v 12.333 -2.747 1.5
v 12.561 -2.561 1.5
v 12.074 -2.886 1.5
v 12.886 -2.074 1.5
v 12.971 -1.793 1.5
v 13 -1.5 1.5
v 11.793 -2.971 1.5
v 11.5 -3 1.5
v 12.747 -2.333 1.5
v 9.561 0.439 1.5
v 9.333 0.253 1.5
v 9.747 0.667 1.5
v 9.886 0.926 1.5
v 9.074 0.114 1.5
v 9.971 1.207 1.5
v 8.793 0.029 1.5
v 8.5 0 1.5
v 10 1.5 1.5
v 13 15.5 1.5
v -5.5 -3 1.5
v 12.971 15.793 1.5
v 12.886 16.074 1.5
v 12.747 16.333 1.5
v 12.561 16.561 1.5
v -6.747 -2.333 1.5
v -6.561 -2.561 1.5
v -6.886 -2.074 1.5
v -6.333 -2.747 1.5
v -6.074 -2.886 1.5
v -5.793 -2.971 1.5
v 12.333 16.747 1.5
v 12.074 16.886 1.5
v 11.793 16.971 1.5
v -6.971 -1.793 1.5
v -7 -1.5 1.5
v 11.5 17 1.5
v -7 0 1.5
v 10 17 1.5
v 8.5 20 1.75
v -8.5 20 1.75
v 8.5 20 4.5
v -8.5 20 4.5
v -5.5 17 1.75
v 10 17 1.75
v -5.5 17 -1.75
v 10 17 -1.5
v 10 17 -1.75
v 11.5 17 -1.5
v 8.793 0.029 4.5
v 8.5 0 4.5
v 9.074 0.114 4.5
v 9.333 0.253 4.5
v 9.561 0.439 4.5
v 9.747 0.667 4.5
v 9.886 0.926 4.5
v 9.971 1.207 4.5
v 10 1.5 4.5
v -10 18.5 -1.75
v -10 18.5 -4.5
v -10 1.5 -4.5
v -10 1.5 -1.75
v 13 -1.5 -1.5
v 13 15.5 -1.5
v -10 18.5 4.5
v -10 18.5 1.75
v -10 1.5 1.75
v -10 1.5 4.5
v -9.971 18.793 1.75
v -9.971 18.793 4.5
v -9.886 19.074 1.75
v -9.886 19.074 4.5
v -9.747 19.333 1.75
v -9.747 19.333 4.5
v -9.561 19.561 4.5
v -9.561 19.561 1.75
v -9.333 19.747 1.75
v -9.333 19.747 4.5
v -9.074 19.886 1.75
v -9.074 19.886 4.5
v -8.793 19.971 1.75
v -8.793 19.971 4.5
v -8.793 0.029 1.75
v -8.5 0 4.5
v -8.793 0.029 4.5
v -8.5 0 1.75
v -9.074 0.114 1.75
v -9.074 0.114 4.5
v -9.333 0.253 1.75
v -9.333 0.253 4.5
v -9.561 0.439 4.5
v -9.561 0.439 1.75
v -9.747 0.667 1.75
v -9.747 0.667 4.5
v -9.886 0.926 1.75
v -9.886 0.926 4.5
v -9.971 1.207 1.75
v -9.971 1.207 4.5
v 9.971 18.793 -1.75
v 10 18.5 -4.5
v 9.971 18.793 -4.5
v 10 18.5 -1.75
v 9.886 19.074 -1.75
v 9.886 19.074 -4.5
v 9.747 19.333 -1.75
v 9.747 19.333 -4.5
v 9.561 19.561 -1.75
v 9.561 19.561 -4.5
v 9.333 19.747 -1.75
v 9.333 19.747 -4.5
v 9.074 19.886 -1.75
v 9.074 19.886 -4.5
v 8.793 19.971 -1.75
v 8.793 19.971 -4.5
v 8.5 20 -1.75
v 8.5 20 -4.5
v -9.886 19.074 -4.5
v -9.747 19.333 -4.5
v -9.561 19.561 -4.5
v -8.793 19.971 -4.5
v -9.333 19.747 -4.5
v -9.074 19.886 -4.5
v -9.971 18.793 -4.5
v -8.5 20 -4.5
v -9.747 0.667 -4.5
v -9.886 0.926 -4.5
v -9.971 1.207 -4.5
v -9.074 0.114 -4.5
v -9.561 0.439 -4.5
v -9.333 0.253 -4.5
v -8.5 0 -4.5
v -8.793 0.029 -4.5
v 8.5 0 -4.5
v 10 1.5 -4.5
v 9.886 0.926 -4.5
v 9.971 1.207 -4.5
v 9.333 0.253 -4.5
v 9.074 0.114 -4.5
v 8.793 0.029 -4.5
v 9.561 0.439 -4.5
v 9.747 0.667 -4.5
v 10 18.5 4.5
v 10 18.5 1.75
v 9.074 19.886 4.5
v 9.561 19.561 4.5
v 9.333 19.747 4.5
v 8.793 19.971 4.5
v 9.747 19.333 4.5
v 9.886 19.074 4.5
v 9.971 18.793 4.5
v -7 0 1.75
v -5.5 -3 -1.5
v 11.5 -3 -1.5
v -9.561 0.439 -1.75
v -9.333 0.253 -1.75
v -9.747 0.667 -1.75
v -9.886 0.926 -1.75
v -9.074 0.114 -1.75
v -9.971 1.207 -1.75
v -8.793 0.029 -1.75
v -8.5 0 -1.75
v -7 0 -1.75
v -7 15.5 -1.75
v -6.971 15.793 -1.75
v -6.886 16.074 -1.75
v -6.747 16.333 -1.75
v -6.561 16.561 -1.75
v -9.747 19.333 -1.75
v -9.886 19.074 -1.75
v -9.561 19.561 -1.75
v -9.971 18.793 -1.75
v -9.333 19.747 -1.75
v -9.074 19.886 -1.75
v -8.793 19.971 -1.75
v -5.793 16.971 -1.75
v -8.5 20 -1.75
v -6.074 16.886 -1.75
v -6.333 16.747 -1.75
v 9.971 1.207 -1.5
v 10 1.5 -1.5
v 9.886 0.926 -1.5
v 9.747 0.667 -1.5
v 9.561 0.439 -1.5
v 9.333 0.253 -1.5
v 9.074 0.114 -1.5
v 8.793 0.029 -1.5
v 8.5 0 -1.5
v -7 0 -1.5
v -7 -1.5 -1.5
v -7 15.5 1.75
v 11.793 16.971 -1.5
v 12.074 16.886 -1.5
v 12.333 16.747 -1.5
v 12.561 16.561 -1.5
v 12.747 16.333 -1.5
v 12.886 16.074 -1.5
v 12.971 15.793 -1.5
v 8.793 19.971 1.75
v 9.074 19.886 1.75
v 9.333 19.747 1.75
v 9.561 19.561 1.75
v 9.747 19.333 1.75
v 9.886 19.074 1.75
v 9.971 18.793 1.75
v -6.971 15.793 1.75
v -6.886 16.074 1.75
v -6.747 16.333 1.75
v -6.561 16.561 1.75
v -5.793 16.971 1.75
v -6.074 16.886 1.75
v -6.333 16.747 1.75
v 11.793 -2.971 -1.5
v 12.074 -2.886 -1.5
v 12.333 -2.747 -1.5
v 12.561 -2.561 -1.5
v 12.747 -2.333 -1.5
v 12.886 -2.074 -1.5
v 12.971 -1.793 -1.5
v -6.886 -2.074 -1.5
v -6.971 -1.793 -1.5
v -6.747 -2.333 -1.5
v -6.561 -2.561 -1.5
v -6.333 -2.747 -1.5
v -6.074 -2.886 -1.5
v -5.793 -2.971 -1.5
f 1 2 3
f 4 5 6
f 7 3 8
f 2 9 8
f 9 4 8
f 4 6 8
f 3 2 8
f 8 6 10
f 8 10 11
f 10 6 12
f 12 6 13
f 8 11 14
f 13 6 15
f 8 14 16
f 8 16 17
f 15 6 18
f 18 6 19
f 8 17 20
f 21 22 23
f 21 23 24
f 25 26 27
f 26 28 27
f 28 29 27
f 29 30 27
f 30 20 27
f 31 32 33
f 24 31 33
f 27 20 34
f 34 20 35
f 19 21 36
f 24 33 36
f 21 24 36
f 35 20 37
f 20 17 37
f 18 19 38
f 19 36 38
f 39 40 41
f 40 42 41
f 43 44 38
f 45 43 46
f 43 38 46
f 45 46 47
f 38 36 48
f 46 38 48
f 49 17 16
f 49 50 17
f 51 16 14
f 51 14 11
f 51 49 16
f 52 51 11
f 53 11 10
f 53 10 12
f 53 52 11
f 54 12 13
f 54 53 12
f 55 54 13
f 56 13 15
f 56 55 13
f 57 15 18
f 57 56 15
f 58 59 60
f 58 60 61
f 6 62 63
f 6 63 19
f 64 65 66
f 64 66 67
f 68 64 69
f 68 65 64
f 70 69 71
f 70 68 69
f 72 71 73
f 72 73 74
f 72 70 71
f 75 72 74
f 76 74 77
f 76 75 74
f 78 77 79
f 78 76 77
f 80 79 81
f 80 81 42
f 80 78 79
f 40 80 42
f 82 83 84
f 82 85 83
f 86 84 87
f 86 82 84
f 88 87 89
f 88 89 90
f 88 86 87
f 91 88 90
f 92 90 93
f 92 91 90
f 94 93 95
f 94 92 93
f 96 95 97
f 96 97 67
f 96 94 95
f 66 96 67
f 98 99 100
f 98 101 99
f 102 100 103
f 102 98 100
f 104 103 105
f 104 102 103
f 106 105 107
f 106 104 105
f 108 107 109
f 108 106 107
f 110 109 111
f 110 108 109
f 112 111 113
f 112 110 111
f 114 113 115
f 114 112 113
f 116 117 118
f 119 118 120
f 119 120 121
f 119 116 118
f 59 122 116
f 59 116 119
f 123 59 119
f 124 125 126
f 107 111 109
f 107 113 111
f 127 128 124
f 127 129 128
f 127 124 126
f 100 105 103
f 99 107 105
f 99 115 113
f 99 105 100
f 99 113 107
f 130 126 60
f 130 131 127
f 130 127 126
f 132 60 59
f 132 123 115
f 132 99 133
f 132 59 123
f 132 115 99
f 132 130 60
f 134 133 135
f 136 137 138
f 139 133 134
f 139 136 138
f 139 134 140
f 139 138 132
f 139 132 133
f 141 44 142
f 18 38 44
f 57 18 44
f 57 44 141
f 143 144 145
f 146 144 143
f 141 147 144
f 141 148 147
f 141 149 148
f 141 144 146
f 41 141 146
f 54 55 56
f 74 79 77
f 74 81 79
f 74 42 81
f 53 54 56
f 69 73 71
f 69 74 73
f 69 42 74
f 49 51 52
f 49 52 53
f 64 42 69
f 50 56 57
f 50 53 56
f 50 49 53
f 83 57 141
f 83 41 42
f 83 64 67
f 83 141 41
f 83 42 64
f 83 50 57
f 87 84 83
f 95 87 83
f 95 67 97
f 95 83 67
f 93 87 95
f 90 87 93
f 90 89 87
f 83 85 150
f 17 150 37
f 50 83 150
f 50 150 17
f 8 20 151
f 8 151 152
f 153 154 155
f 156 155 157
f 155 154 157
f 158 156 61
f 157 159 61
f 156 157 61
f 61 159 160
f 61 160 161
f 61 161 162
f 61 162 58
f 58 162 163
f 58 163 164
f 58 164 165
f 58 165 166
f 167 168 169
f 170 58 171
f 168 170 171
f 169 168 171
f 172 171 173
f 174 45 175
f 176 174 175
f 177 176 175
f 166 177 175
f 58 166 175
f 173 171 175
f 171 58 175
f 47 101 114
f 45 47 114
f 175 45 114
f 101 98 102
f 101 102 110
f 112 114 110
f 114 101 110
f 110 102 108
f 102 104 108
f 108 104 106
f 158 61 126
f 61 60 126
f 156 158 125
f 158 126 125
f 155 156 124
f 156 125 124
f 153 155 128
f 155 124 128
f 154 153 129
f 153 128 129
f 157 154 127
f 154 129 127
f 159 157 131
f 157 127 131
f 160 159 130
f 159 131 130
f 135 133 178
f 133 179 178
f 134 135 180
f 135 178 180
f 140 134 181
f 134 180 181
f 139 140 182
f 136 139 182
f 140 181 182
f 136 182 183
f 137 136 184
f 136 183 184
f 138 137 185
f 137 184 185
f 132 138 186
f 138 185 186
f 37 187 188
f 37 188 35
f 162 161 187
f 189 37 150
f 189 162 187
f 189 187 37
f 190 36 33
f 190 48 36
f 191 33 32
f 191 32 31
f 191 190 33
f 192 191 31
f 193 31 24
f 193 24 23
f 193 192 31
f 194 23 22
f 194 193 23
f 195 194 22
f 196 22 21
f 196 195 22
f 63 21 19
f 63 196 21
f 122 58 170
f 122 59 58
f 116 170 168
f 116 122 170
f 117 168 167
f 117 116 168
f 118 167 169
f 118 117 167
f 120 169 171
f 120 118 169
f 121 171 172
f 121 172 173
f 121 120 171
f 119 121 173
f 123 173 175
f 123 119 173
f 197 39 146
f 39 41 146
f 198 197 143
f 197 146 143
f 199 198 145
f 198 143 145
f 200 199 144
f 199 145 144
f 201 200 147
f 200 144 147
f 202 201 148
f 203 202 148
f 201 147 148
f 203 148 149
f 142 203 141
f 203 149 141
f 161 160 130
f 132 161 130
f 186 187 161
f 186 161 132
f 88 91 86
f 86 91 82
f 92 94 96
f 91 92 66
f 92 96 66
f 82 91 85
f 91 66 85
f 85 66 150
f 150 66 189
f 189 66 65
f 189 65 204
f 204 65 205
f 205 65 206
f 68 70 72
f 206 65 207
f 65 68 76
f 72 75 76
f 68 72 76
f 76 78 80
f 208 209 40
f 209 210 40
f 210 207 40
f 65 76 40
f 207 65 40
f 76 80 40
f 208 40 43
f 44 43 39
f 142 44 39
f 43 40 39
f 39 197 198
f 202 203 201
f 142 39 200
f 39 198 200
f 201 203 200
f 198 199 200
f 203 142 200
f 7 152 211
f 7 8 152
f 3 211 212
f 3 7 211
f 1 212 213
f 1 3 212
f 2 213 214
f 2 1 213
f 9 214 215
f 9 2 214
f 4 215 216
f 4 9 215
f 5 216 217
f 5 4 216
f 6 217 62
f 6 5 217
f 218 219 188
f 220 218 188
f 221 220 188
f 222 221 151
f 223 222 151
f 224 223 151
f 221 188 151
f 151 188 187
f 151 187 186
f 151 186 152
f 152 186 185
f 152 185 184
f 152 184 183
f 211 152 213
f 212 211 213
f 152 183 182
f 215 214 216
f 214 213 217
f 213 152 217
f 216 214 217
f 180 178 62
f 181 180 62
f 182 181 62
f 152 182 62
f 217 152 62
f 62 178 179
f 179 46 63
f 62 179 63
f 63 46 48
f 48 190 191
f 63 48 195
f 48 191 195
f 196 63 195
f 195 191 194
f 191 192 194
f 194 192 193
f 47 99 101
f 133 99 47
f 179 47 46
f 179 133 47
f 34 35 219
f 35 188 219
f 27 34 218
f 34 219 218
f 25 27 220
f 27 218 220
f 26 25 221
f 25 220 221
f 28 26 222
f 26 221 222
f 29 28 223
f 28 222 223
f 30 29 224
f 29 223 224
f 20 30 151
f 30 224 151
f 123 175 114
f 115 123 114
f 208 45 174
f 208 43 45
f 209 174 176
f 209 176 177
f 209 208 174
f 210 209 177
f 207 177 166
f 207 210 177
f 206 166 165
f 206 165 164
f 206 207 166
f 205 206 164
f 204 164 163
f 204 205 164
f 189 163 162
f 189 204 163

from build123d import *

# Parameters (mm, degrees)
F0_W     = 14
F0_H     = 3
F0_W_2   = 3
F1_DEPTH = 20
F2_DEPTH = 3
F3_W     = 3
F3_H     = 3
F4_DEPTH = 100
F5_W     = 3
F5_H     = 3.5
F6_DEPTH = 100
F7_R     = 1.5


with BuildPart() as f1:
    # F0 (on Front) → F1 (new body)
    with BuildSketch(Plane.XZ):
        Polygon((10, 1.5), (10, 4.5), (-10, 4.5), (-10, 1.5), (-7, 1.5), (7, 1.5), align=None)
        Rectangle(F0_W, F0_H)
        with Locations((11.5, 0)):
            Rectangle(F0_W_2, F0_H)
        with Locations((8.5, 0)):
            Rectangle(F0_W_2, F0_H)
        with Locations((-8.5, 0)):
            Rectangle(F0_W_2, F0_H)
        Polygon((10, -4.5), (10, -1.5), (7, -1.5), (-7, -1.5), (-10, -1.5), (-10, -4.5), align=None)
    extrude(amount=-F1_DEPTH)

    # F0 (on Front) → F2 (join)
    with BuildSketch(Plane.XZ):
        with Locations((-8.5, 0)):
            Rectangle(F0_W_2, F0_H)
        Rectangle(F0_W, F0_H)
        with Locations((8.5, 0)):
            Rectangle(F0_W_2, F0_H)
        with Locations((11.5, 0)):
            Rectangle(F0_W_2, F0_H)
    extrude(amount=F2_DEPTH)

    # F3 (on face) → F4 (cut)
    with BuildSketch(Plane.YZ.offset(13)):
        Polygon((23, -1.75), (23, 1.75), (17, 1.75), (17, 1.5), (20, 1.5), (20, -1.5), (17, -1.5), (17, -1.75), align=None)
        with Locations((18.5, 0)):
            Rectangle(F3_W, F3_H)
    extrude(amount=-F4_DEPTH, mode=Mode.SUBTRACT)

    # F5 (on face) → F6 (cut)
    with BuildSketch(Plane(origin=(0, 17, 0), x_dir=(-1, 0, 0), z_dir=(0, 1, 0))):
        with Locations((11.5, 0)):
            Rectangle(F5_W, F5_H)
        with Locations((8.5, 0)):
            Rectangle(F5_W, F5_H)
    extrude(amount=-F6_DEPTH, mode=Mode.SUBTRACT)

    # F7
    f7_edges = [f1.edges().sort_by_distance(p)[0] for p in [
        (-7, -3, 0),
        (13, -3, 0),
        (10, 0, 3),
        (10, 0, -3),
        (-10, 0, -3.125),
        (-10, 0, 3.125),
        (-7, 17, 0),
        (-10, 20, 3.125),
        (-10, 20, -3.125),
        (13, 17, 0),
        (10, 20, 3.125),
        (10, 20, -3.125),
    ]]
    fillet(f7_edges, radius=F7_R)


solid = f1.part
